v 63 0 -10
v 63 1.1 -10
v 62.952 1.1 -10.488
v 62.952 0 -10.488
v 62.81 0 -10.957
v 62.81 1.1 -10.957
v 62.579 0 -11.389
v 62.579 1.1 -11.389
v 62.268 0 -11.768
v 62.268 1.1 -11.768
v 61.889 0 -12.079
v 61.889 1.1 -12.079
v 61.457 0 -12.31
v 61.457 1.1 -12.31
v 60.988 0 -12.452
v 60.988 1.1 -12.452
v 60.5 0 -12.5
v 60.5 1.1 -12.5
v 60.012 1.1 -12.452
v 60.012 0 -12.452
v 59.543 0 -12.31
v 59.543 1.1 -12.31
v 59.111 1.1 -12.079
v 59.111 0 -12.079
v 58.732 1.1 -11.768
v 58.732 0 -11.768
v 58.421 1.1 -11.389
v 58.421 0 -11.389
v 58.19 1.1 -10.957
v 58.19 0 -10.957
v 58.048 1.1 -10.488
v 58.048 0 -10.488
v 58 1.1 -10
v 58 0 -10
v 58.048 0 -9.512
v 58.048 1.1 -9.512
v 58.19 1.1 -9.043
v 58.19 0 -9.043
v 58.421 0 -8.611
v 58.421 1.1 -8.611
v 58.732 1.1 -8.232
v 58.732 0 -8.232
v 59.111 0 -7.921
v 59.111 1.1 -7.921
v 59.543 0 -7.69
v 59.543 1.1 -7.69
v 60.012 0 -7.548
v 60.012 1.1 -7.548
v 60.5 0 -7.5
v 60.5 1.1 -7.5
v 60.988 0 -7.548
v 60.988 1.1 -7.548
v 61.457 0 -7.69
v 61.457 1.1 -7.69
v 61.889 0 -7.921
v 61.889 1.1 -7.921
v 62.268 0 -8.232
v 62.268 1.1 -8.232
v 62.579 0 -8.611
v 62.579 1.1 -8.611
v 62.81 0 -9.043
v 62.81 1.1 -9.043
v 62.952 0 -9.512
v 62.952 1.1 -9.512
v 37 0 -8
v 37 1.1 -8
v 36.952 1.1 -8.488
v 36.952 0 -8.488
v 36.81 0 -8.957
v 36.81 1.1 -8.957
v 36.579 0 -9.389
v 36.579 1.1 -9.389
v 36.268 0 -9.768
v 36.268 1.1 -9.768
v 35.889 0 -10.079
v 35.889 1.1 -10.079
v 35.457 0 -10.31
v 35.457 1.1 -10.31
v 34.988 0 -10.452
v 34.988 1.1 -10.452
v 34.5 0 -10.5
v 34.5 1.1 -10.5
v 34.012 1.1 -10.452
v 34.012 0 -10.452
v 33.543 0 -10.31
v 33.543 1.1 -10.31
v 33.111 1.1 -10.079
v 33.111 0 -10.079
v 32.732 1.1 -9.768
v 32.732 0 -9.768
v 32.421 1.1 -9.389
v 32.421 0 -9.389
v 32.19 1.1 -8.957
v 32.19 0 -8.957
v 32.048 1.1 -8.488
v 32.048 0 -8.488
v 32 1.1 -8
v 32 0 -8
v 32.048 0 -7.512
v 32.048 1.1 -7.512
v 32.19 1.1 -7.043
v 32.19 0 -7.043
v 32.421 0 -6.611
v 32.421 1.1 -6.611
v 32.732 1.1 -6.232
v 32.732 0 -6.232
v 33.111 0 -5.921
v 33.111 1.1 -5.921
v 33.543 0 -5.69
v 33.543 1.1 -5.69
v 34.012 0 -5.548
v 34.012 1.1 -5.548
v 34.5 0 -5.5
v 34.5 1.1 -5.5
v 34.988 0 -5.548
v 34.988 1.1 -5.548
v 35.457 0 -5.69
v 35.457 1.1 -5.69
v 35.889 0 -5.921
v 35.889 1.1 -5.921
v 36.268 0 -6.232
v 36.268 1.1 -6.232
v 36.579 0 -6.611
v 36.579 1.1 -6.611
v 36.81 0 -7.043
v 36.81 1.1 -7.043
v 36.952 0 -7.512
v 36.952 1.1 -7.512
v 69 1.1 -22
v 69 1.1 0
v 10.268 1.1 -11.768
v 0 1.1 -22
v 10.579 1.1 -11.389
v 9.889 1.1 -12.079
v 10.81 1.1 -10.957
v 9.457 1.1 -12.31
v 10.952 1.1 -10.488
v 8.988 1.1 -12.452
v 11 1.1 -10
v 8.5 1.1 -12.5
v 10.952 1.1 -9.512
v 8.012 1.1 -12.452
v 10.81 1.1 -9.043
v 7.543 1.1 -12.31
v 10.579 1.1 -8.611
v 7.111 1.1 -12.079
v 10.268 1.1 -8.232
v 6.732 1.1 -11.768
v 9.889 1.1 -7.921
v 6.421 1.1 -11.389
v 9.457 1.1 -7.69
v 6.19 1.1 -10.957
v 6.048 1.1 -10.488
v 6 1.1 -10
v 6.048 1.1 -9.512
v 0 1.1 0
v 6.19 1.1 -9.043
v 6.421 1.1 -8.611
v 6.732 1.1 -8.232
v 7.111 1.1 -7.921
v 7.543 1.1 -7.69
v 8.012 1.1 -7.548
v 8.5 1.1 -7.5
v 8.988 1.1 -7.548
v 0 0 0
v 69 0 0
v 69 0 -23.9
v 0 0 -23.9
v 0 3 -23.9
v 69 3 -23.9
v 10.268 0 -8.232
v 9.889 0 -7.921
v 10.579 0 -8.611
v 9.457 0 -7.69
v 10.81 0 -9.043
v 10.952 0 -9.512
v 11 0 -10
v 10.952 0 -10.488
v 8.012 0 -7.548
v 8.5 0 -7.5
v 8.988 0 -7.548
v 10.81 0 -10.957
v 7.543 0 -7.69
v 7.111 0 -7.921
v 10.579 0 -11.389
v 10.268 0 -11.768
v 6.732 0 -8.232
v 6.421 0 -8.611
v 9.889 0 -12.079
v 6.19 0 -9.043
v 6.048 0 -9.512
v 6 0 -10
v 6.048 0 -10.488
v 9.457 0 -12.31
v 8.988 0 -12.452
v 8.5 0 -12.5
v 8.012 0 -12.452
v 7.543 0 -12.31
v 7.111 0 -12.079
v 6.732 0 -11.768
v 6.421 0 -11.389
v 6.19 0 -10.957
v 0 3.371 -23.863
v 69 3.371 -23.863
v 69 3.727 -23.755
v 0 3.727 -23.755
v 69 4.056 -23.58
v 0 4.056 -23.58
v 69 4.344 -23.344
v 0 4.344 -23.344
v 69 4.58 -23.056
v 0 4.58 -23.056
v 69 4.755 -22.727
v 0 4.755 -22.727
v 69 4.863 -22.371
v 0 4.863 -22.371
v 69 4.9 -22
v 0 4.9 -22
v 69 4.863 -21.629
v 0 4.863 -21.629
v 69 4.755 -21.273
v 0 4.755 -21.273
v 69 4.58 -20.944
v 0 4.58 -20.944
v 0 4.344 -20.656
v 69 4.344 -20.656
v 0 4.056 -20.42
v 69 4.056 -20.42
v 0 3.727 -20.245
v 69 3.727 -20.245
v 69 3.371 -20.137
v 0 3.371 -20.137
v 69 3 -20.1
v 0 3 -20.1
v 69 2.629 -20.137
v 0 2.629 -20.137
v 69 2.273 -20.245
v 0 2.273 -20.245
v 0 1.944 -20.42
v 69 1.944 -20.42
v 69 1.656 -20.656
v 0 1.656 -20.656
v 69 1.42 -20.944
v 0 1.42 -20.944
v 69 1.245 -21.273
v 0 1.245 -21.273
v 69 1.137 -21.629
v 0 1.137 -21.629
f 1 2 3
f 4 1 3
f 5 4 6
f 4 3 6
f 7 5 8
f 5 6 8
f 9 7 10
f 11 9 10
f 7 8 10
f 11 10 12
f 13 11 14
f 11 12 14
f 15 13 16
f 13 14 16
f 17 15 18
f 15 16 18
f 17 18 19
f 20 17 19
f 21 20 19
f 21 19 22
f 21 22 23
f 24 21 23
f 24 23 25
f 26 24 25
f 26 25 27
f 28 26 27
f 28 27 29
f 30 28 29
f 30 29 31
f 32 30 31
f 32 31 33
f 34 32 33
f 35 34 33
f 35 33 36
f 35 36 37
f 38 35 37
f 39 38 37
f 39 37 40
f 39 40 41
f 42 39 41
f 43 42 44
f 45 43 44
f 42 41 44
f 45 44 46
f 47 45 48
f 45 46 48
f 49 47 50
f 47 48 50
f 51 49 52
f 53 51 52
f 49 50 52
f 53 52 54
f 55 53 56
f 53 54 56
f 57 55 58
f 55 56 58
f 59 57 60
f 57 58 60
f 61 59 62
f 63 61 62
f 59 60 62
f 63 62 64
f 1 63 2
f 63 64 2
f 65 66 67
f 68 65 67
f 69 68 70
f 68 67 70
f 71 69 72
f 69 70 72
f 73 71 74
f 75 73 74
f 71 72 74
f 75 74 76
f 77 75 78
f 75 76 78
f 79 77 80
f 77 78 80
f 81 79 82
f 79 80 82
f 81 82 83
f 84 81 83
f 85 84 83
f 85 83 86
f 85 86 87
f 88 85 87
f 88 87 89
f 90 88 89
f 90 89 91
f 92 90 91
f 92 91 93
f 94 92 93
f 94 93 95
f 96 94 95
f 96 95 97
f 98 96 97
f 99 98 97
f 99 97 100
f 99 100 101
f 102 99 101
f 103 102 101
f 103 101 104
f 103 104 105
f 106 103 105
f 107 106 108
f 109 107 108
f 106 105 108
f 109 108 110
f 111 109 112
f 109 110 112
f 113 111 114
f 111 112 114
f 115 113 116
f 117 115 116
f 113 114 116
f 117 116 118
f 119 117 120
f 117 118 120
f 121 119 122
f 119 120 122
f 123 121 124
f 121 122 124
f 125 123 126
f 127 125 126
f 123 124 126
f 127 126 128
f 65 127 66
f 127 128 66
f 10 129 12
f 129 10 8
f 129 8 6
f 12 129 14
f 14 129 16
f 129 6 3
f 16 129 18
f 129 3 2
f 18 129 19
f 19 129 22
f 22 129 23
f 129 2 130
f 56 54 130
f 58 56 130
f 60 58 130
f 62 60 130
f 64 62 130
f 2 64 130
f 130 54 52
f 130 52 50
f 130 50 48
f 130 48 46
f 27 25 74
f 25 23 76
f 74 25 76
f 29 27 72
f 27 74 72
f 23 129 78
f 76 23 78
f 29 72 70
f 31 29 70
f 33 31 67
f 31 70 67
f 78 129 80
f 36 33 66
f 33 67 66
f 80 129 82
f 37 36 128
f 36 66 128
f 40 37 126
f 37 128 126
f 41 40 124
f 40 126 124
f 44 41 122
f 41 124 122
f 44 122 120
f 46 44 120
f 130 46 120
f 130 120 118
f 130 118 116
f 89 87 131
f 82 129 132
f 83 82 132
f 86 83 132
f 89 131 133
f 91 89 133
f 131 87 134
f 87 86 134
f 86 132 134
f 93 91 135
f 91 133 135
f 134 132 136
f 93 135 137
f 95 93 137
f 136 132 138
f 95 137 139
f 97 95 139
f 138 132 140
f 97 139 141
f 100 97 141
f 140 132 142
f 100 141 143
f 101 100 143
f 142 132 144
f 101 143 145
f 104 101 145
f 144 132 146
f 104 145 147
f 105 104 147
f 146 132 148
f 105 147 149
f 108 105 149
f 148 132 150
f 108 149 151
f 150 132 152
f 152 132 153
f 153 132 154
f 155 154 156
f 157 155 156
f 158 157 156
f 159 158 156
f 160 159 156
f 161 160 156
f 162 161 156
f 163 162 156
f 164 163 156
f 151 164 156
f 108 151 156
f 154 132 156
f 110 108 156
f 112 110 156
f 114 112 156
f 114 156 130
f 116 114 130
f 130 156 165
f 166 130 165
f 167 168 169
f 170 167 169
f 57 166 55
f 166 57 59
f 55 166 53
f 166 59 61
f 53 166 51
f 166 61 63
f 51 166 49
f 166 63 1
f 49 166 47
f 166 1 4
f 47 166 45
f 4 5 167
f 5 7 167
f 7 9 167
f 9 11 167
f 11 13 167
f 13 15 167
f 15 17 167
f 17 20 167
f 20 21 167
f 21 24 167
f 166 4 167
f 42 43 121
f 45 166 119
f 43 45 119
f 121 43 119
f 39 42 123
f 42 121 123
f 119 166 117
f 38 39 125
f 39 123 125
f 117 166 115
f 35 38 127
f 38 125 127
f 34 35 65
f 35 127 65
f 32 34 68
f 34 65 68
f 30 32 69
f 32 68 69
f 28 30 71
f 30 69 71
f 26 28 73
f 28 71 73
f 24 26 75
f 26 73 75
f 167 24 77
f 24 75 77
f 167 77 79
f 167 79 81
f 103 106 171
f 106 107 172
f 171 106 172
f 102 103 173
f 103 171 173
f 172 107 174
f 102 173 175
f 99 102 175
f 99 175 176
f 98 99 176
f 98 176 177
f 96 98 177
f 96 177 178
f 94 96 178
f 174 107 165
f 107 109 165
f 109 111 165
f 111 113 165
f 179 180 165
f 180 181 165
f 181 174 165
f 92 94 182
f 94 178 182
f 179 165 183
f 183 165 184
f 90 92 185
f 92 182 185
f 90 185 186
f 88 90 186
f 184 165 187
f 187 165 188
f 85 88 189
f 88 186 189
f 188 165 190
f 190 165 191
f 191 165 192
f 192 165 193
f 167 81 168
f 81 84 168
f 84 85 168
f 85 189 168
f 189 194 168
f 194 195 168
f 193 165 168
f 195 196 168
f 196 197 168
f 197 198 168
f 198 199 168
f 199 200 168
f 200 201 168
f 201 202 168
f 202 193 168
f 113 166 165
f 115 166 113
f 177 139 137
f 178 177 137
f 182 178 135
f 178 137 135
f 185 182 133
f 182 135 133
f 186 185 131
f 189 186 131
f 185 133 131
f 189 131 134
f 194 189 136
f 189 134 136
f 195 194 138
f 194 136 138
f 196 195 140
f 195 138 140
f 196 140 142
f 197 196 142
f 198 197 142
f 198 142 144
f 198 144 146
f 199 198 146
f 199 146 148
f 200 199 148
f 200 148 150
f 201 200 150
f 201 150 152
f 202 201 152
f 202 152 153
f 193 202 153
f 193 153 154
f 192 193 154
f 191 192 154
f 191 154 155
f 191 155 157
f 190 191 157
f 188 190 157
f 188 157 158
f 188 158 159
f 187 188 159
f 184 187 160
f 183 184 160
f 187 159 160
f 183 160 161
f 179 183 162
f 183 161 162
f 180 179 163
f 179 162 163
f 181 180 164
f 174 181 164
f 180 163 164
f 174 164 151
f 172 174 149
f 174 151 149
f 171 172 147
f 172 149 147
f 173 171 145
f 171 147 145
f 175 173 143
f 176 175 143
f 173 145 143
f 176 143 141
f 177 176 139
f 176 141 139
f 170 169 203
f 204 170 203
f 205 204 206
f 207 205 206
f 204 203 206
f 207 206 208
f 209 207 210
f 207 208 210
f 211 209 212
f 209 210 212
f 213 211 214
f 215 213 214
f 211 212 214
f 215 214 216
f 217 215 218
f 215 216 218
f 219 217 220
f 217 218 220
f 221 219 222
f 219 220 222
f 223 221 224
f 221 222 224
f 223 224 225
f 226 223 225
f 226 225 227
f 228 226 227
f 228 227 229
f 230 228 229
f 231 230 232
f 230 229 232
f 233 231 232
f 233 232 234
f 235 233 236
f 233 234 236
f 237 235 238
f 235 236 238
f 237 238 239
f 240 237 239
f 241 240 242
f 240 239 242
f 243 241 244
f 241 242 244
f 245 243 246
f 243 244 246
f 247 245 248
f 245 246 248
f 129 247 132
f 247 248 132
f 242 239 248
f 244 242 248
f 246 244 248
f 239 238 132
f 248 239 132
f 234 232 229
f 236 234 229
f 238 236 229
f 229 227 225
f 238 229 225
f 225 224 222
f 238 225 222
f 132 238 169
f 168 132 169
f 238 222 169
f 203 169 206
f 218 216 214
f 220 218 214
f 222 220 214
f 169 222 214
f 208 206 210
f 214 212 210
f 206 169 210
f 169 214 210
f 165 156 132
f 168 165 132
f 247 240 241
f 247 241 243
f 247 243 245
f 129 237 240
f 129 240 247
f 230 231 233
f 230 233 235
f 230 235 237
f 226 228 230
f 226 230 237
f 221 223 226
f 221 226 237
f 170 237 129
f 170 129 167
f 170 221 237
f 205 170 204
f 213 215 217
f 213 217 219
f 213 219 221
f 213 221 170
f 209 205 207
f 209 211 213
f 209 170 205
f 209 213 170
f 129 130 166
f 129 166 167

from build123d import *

# Parameters (mm, degrees)
SKETCH_1_R          = 1.9
EXTRUDE_1_DEPTH     = 69
SKETCH_2_R          = 2.5
CUT_EXTRUDE_1_DEPTH = 2.1


with BuildPart() as part:
    # 草图1 → 凸台-拉伸1 (new body)
    with BuildSketch(Plane(origin=(0, 0, 0), x_dir=(0, 0, -1), z_dir=(1, 0, 0))):
        with Locations((22, 3)):
            Circle(SKETCH_1_R)
        with BuildLine():
            Line((0, 1.1), (0, 0))
            Line((0, 0), (19, 0))
            Line((19, 0), (23.9, 0))
            Line((23.9, 0), (23.9, 3))
            ThreePointArc((23.9, 3), (23.343502884, 1.656497116), (22, 1.1))
            Line((22, 1.1), (19, 1.1))
            Line((19, 1.1), (0, 1.1))
        make_face()
    extrude(amount=EXTRUDE_1_DEPTH)

    # 草图2 → 切除-拉伸1 (cut, through all)
    with BuildSketch(Plane(origin=(0, 1.1, 0), x_dir=(1, 0, 0), z_dir=(0, 1, 0))):
        with Locations((8.5, 10)):
            Circle(SKETCH_2_R)
        with Locations((60.5, 10)):
            Circle(SKETCH_2_R)
        with Locations((34.5, 8)):
            Circle(SKETCH_2_R)
    extrude(amount=-CUT_EXTRUDE_1_DEPTH, mode=Mode.SUBTRACT)


solid = part.part
